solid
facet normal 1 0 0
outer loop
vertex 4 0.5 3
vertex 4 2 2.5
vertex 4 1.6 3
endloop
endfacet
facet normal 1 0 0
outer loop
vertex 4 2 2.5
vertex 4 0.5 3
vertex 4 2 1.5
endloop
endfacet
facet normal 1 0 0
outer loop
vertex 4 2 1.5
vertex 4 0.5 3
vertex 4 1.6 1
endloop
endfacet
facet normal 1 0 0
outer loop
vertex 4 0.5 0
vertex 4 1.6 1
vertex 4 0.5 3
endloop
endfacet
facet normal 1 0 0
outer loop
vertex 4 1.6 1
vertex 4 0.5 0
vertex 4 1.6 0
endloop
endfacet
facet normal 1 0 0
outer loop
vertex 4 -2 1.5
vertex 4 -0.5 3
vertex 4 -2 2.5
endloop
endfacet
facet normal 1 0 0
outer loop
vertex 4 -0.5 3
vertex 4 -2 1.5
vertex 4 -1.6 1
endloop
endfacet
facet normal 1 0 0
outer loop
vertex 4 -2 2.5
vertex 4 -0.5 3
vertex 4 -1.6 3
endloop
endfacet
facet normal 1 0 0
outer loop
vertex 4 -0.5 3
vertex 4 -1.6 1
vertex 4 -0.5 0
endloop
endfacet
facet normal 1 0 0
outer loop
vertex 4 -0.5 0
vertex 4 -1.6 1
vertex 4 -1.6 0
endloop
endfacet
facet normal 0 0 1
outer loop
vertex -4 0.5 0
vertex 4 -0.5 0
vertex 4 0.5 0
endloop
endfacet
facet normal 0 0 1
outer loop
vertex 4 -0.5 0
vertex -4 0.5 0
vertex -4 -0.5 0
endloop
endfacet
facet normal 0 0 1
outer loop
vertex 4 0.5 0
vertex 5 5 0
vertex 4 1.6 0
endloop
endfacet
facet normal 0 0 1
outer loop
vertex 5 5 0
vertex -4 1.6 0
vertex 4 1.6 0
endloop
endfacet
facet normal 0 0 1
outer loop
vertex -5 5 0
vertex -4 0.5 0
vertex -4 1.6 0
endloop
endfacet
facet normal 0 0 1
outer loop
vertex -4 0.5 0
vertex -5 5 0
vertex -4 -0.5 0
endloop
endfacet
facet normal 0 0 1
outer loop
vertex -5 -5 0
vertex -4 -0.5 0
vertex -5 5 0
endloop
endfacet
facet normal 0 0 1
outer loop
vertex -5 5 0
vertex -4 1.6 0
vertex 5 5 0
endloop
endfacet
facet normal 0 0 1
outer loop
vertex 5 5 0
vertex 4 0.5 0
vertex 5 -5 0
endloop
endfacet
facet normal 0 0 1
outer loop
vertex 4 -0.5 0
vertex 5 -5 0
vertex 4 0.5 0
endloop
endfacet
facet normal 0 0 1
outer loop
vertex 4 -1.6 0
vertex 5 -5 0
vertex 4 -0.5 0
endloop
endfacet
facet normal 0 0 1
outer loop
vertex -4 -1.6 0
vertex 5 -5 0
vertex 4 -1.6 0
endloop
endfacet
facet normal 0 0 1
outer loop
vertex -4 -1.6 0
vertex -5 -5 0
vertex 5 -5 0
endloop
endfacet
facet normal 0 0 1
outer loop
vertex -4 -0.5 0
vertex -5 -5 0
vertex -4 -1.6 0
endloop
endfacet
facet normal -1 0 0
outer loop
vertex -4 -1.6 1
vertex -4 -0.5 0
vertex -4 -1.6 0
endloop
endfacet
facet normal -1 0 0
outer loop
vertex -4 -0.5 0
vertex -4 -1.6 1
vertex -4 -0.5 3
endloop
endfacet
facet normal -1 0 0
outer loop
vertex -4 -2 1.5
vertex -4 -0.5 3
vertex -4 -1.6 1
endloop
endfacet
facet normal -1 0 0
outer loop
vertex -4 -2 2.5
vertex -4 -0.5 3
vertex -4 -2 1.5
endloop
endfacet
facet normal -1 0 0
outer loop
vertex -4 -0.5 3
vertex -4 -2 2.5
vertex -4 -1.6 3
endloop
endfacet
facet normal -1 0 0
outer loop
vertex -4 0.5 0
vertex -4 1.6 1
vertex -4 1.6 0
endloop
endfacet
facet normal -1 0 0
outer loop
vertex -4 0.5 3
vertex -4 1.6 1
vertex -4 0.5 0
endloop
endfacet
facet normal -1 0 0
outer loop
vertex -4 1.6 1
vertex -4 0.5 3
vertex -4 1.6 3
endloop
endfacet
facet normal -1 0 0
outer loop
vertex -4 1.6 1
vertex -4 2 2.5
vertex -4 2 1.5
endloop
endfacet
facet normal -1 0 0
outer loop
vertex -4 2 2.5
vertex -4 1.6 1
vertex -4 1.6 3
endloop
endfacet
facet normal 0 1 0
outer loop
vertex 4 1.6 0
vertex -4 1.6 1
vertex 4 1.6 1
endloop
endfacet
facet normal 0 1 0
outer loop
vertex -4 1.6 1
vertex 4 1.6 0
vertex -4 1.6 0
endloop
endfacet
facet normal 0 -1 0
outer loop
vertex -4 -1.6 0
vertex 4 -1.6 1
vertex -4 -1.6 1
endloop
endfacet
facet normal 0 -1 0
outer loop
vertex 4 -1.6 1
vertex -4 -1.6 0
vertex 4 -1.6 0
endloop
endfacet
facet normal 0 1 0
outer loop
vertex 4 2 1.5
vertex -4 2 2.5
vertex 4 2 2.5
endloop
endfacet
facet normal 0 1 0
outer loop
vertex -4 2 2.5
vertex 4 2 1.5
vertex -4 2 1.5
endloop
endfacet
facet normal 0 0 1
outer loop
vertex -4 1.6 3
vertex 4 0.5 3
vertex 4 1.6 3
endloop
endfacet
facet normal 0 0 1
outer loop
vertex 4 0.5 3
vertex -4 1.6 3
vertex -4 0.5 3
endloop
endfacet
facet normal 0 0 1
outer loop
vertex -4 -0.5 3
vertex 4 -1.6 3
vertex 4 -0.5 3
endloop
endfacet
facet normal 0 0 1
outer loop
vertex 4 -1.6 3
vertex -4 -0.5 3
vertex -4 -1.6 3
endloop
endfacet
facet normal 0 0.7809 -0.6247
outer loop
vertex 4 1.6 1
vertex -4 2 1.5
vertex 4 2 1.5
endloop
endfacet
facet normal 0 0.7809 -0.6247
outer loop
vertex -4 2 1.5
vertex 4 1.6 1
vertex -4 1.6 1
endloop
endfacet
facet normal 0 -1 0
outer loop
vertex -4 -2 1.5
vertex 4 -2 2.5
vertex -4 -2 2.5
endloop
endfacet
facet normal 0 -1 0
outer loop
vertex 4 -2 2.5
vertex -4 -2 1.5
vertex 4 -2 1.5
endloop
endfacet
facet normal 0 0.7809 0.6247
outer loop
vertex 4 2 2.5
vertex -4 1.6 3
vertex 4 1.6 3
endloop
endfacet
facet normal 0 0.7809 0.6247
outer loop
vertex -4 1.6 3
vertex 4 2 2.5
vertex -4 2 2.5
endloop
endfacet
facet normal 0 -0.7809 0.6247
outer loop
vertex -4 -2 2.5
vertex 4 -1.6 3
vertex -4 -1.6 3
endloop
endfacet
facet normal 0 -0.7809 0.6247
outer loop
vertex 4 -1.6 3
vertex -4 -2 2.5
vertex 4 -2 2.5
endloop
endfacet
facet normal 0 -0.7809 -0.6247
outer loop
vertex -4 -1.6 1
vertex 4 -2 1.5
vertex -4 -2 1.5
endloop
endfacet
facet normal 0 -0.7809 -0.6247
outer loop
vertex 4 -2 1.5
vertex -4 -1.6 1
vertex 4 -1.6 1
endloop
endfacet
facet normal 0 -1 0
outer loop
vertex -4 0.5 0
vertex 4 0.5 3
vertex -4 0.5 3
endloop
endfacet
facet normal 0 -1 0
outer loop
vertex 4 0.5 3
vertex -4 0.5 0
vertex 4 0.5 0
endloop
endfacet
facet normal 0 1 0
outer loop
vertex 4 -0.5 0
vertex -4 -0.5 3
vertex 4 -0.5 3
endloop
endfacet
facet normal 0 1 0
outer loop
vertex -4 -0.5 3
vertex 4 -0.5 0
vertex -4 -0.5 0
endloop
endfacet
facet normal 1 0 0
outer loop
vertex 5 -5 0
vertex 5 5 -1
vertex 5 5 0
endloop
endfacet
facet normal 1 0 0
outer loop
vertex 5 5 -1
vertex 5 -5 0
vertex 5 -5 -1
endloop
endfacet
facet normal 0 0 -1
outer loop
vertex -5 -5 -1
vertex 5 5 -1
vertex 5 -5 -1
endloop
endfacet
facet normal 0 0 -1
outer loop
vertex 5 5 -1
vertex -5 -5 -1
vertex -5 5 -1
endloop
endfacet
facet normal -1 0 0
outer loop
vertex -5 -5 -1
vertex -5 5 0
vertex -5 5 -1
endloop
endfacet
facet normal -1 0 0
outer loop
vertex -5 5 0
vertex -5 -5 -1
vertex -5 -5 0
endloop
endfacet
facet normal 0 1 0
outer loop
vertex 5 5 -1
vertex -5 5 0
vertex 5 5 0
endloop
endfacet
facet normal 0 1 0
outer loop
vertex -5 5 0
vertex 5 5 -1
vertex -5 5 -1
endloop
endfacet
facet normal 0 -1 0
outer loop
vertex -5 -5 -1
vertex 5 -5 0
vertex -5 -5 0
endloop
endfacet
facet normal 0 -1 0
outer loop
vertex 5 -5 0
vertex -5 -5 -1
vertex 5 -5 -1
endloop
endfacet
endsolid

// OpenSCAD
width = 10;
length = 10;
thickness = 1;

clipLength = 8;

translate([0, 0, -thickness / 2]) cube([length, width, thickness], center = true);

difference() {
    union() {
        translate([0, 0, 1.5/2]) cube([clipLength, 3.2, 1.5], center = true);
        translate([0, 0, 2]) hull() {
            cube([clipLength, 3.2, 2], center = true);
            cube([clipLength, 4, 1], center = true);
        }
    }
    translate([0, 0, 5/2]) cube([length, 1, 5], center = true);
}
